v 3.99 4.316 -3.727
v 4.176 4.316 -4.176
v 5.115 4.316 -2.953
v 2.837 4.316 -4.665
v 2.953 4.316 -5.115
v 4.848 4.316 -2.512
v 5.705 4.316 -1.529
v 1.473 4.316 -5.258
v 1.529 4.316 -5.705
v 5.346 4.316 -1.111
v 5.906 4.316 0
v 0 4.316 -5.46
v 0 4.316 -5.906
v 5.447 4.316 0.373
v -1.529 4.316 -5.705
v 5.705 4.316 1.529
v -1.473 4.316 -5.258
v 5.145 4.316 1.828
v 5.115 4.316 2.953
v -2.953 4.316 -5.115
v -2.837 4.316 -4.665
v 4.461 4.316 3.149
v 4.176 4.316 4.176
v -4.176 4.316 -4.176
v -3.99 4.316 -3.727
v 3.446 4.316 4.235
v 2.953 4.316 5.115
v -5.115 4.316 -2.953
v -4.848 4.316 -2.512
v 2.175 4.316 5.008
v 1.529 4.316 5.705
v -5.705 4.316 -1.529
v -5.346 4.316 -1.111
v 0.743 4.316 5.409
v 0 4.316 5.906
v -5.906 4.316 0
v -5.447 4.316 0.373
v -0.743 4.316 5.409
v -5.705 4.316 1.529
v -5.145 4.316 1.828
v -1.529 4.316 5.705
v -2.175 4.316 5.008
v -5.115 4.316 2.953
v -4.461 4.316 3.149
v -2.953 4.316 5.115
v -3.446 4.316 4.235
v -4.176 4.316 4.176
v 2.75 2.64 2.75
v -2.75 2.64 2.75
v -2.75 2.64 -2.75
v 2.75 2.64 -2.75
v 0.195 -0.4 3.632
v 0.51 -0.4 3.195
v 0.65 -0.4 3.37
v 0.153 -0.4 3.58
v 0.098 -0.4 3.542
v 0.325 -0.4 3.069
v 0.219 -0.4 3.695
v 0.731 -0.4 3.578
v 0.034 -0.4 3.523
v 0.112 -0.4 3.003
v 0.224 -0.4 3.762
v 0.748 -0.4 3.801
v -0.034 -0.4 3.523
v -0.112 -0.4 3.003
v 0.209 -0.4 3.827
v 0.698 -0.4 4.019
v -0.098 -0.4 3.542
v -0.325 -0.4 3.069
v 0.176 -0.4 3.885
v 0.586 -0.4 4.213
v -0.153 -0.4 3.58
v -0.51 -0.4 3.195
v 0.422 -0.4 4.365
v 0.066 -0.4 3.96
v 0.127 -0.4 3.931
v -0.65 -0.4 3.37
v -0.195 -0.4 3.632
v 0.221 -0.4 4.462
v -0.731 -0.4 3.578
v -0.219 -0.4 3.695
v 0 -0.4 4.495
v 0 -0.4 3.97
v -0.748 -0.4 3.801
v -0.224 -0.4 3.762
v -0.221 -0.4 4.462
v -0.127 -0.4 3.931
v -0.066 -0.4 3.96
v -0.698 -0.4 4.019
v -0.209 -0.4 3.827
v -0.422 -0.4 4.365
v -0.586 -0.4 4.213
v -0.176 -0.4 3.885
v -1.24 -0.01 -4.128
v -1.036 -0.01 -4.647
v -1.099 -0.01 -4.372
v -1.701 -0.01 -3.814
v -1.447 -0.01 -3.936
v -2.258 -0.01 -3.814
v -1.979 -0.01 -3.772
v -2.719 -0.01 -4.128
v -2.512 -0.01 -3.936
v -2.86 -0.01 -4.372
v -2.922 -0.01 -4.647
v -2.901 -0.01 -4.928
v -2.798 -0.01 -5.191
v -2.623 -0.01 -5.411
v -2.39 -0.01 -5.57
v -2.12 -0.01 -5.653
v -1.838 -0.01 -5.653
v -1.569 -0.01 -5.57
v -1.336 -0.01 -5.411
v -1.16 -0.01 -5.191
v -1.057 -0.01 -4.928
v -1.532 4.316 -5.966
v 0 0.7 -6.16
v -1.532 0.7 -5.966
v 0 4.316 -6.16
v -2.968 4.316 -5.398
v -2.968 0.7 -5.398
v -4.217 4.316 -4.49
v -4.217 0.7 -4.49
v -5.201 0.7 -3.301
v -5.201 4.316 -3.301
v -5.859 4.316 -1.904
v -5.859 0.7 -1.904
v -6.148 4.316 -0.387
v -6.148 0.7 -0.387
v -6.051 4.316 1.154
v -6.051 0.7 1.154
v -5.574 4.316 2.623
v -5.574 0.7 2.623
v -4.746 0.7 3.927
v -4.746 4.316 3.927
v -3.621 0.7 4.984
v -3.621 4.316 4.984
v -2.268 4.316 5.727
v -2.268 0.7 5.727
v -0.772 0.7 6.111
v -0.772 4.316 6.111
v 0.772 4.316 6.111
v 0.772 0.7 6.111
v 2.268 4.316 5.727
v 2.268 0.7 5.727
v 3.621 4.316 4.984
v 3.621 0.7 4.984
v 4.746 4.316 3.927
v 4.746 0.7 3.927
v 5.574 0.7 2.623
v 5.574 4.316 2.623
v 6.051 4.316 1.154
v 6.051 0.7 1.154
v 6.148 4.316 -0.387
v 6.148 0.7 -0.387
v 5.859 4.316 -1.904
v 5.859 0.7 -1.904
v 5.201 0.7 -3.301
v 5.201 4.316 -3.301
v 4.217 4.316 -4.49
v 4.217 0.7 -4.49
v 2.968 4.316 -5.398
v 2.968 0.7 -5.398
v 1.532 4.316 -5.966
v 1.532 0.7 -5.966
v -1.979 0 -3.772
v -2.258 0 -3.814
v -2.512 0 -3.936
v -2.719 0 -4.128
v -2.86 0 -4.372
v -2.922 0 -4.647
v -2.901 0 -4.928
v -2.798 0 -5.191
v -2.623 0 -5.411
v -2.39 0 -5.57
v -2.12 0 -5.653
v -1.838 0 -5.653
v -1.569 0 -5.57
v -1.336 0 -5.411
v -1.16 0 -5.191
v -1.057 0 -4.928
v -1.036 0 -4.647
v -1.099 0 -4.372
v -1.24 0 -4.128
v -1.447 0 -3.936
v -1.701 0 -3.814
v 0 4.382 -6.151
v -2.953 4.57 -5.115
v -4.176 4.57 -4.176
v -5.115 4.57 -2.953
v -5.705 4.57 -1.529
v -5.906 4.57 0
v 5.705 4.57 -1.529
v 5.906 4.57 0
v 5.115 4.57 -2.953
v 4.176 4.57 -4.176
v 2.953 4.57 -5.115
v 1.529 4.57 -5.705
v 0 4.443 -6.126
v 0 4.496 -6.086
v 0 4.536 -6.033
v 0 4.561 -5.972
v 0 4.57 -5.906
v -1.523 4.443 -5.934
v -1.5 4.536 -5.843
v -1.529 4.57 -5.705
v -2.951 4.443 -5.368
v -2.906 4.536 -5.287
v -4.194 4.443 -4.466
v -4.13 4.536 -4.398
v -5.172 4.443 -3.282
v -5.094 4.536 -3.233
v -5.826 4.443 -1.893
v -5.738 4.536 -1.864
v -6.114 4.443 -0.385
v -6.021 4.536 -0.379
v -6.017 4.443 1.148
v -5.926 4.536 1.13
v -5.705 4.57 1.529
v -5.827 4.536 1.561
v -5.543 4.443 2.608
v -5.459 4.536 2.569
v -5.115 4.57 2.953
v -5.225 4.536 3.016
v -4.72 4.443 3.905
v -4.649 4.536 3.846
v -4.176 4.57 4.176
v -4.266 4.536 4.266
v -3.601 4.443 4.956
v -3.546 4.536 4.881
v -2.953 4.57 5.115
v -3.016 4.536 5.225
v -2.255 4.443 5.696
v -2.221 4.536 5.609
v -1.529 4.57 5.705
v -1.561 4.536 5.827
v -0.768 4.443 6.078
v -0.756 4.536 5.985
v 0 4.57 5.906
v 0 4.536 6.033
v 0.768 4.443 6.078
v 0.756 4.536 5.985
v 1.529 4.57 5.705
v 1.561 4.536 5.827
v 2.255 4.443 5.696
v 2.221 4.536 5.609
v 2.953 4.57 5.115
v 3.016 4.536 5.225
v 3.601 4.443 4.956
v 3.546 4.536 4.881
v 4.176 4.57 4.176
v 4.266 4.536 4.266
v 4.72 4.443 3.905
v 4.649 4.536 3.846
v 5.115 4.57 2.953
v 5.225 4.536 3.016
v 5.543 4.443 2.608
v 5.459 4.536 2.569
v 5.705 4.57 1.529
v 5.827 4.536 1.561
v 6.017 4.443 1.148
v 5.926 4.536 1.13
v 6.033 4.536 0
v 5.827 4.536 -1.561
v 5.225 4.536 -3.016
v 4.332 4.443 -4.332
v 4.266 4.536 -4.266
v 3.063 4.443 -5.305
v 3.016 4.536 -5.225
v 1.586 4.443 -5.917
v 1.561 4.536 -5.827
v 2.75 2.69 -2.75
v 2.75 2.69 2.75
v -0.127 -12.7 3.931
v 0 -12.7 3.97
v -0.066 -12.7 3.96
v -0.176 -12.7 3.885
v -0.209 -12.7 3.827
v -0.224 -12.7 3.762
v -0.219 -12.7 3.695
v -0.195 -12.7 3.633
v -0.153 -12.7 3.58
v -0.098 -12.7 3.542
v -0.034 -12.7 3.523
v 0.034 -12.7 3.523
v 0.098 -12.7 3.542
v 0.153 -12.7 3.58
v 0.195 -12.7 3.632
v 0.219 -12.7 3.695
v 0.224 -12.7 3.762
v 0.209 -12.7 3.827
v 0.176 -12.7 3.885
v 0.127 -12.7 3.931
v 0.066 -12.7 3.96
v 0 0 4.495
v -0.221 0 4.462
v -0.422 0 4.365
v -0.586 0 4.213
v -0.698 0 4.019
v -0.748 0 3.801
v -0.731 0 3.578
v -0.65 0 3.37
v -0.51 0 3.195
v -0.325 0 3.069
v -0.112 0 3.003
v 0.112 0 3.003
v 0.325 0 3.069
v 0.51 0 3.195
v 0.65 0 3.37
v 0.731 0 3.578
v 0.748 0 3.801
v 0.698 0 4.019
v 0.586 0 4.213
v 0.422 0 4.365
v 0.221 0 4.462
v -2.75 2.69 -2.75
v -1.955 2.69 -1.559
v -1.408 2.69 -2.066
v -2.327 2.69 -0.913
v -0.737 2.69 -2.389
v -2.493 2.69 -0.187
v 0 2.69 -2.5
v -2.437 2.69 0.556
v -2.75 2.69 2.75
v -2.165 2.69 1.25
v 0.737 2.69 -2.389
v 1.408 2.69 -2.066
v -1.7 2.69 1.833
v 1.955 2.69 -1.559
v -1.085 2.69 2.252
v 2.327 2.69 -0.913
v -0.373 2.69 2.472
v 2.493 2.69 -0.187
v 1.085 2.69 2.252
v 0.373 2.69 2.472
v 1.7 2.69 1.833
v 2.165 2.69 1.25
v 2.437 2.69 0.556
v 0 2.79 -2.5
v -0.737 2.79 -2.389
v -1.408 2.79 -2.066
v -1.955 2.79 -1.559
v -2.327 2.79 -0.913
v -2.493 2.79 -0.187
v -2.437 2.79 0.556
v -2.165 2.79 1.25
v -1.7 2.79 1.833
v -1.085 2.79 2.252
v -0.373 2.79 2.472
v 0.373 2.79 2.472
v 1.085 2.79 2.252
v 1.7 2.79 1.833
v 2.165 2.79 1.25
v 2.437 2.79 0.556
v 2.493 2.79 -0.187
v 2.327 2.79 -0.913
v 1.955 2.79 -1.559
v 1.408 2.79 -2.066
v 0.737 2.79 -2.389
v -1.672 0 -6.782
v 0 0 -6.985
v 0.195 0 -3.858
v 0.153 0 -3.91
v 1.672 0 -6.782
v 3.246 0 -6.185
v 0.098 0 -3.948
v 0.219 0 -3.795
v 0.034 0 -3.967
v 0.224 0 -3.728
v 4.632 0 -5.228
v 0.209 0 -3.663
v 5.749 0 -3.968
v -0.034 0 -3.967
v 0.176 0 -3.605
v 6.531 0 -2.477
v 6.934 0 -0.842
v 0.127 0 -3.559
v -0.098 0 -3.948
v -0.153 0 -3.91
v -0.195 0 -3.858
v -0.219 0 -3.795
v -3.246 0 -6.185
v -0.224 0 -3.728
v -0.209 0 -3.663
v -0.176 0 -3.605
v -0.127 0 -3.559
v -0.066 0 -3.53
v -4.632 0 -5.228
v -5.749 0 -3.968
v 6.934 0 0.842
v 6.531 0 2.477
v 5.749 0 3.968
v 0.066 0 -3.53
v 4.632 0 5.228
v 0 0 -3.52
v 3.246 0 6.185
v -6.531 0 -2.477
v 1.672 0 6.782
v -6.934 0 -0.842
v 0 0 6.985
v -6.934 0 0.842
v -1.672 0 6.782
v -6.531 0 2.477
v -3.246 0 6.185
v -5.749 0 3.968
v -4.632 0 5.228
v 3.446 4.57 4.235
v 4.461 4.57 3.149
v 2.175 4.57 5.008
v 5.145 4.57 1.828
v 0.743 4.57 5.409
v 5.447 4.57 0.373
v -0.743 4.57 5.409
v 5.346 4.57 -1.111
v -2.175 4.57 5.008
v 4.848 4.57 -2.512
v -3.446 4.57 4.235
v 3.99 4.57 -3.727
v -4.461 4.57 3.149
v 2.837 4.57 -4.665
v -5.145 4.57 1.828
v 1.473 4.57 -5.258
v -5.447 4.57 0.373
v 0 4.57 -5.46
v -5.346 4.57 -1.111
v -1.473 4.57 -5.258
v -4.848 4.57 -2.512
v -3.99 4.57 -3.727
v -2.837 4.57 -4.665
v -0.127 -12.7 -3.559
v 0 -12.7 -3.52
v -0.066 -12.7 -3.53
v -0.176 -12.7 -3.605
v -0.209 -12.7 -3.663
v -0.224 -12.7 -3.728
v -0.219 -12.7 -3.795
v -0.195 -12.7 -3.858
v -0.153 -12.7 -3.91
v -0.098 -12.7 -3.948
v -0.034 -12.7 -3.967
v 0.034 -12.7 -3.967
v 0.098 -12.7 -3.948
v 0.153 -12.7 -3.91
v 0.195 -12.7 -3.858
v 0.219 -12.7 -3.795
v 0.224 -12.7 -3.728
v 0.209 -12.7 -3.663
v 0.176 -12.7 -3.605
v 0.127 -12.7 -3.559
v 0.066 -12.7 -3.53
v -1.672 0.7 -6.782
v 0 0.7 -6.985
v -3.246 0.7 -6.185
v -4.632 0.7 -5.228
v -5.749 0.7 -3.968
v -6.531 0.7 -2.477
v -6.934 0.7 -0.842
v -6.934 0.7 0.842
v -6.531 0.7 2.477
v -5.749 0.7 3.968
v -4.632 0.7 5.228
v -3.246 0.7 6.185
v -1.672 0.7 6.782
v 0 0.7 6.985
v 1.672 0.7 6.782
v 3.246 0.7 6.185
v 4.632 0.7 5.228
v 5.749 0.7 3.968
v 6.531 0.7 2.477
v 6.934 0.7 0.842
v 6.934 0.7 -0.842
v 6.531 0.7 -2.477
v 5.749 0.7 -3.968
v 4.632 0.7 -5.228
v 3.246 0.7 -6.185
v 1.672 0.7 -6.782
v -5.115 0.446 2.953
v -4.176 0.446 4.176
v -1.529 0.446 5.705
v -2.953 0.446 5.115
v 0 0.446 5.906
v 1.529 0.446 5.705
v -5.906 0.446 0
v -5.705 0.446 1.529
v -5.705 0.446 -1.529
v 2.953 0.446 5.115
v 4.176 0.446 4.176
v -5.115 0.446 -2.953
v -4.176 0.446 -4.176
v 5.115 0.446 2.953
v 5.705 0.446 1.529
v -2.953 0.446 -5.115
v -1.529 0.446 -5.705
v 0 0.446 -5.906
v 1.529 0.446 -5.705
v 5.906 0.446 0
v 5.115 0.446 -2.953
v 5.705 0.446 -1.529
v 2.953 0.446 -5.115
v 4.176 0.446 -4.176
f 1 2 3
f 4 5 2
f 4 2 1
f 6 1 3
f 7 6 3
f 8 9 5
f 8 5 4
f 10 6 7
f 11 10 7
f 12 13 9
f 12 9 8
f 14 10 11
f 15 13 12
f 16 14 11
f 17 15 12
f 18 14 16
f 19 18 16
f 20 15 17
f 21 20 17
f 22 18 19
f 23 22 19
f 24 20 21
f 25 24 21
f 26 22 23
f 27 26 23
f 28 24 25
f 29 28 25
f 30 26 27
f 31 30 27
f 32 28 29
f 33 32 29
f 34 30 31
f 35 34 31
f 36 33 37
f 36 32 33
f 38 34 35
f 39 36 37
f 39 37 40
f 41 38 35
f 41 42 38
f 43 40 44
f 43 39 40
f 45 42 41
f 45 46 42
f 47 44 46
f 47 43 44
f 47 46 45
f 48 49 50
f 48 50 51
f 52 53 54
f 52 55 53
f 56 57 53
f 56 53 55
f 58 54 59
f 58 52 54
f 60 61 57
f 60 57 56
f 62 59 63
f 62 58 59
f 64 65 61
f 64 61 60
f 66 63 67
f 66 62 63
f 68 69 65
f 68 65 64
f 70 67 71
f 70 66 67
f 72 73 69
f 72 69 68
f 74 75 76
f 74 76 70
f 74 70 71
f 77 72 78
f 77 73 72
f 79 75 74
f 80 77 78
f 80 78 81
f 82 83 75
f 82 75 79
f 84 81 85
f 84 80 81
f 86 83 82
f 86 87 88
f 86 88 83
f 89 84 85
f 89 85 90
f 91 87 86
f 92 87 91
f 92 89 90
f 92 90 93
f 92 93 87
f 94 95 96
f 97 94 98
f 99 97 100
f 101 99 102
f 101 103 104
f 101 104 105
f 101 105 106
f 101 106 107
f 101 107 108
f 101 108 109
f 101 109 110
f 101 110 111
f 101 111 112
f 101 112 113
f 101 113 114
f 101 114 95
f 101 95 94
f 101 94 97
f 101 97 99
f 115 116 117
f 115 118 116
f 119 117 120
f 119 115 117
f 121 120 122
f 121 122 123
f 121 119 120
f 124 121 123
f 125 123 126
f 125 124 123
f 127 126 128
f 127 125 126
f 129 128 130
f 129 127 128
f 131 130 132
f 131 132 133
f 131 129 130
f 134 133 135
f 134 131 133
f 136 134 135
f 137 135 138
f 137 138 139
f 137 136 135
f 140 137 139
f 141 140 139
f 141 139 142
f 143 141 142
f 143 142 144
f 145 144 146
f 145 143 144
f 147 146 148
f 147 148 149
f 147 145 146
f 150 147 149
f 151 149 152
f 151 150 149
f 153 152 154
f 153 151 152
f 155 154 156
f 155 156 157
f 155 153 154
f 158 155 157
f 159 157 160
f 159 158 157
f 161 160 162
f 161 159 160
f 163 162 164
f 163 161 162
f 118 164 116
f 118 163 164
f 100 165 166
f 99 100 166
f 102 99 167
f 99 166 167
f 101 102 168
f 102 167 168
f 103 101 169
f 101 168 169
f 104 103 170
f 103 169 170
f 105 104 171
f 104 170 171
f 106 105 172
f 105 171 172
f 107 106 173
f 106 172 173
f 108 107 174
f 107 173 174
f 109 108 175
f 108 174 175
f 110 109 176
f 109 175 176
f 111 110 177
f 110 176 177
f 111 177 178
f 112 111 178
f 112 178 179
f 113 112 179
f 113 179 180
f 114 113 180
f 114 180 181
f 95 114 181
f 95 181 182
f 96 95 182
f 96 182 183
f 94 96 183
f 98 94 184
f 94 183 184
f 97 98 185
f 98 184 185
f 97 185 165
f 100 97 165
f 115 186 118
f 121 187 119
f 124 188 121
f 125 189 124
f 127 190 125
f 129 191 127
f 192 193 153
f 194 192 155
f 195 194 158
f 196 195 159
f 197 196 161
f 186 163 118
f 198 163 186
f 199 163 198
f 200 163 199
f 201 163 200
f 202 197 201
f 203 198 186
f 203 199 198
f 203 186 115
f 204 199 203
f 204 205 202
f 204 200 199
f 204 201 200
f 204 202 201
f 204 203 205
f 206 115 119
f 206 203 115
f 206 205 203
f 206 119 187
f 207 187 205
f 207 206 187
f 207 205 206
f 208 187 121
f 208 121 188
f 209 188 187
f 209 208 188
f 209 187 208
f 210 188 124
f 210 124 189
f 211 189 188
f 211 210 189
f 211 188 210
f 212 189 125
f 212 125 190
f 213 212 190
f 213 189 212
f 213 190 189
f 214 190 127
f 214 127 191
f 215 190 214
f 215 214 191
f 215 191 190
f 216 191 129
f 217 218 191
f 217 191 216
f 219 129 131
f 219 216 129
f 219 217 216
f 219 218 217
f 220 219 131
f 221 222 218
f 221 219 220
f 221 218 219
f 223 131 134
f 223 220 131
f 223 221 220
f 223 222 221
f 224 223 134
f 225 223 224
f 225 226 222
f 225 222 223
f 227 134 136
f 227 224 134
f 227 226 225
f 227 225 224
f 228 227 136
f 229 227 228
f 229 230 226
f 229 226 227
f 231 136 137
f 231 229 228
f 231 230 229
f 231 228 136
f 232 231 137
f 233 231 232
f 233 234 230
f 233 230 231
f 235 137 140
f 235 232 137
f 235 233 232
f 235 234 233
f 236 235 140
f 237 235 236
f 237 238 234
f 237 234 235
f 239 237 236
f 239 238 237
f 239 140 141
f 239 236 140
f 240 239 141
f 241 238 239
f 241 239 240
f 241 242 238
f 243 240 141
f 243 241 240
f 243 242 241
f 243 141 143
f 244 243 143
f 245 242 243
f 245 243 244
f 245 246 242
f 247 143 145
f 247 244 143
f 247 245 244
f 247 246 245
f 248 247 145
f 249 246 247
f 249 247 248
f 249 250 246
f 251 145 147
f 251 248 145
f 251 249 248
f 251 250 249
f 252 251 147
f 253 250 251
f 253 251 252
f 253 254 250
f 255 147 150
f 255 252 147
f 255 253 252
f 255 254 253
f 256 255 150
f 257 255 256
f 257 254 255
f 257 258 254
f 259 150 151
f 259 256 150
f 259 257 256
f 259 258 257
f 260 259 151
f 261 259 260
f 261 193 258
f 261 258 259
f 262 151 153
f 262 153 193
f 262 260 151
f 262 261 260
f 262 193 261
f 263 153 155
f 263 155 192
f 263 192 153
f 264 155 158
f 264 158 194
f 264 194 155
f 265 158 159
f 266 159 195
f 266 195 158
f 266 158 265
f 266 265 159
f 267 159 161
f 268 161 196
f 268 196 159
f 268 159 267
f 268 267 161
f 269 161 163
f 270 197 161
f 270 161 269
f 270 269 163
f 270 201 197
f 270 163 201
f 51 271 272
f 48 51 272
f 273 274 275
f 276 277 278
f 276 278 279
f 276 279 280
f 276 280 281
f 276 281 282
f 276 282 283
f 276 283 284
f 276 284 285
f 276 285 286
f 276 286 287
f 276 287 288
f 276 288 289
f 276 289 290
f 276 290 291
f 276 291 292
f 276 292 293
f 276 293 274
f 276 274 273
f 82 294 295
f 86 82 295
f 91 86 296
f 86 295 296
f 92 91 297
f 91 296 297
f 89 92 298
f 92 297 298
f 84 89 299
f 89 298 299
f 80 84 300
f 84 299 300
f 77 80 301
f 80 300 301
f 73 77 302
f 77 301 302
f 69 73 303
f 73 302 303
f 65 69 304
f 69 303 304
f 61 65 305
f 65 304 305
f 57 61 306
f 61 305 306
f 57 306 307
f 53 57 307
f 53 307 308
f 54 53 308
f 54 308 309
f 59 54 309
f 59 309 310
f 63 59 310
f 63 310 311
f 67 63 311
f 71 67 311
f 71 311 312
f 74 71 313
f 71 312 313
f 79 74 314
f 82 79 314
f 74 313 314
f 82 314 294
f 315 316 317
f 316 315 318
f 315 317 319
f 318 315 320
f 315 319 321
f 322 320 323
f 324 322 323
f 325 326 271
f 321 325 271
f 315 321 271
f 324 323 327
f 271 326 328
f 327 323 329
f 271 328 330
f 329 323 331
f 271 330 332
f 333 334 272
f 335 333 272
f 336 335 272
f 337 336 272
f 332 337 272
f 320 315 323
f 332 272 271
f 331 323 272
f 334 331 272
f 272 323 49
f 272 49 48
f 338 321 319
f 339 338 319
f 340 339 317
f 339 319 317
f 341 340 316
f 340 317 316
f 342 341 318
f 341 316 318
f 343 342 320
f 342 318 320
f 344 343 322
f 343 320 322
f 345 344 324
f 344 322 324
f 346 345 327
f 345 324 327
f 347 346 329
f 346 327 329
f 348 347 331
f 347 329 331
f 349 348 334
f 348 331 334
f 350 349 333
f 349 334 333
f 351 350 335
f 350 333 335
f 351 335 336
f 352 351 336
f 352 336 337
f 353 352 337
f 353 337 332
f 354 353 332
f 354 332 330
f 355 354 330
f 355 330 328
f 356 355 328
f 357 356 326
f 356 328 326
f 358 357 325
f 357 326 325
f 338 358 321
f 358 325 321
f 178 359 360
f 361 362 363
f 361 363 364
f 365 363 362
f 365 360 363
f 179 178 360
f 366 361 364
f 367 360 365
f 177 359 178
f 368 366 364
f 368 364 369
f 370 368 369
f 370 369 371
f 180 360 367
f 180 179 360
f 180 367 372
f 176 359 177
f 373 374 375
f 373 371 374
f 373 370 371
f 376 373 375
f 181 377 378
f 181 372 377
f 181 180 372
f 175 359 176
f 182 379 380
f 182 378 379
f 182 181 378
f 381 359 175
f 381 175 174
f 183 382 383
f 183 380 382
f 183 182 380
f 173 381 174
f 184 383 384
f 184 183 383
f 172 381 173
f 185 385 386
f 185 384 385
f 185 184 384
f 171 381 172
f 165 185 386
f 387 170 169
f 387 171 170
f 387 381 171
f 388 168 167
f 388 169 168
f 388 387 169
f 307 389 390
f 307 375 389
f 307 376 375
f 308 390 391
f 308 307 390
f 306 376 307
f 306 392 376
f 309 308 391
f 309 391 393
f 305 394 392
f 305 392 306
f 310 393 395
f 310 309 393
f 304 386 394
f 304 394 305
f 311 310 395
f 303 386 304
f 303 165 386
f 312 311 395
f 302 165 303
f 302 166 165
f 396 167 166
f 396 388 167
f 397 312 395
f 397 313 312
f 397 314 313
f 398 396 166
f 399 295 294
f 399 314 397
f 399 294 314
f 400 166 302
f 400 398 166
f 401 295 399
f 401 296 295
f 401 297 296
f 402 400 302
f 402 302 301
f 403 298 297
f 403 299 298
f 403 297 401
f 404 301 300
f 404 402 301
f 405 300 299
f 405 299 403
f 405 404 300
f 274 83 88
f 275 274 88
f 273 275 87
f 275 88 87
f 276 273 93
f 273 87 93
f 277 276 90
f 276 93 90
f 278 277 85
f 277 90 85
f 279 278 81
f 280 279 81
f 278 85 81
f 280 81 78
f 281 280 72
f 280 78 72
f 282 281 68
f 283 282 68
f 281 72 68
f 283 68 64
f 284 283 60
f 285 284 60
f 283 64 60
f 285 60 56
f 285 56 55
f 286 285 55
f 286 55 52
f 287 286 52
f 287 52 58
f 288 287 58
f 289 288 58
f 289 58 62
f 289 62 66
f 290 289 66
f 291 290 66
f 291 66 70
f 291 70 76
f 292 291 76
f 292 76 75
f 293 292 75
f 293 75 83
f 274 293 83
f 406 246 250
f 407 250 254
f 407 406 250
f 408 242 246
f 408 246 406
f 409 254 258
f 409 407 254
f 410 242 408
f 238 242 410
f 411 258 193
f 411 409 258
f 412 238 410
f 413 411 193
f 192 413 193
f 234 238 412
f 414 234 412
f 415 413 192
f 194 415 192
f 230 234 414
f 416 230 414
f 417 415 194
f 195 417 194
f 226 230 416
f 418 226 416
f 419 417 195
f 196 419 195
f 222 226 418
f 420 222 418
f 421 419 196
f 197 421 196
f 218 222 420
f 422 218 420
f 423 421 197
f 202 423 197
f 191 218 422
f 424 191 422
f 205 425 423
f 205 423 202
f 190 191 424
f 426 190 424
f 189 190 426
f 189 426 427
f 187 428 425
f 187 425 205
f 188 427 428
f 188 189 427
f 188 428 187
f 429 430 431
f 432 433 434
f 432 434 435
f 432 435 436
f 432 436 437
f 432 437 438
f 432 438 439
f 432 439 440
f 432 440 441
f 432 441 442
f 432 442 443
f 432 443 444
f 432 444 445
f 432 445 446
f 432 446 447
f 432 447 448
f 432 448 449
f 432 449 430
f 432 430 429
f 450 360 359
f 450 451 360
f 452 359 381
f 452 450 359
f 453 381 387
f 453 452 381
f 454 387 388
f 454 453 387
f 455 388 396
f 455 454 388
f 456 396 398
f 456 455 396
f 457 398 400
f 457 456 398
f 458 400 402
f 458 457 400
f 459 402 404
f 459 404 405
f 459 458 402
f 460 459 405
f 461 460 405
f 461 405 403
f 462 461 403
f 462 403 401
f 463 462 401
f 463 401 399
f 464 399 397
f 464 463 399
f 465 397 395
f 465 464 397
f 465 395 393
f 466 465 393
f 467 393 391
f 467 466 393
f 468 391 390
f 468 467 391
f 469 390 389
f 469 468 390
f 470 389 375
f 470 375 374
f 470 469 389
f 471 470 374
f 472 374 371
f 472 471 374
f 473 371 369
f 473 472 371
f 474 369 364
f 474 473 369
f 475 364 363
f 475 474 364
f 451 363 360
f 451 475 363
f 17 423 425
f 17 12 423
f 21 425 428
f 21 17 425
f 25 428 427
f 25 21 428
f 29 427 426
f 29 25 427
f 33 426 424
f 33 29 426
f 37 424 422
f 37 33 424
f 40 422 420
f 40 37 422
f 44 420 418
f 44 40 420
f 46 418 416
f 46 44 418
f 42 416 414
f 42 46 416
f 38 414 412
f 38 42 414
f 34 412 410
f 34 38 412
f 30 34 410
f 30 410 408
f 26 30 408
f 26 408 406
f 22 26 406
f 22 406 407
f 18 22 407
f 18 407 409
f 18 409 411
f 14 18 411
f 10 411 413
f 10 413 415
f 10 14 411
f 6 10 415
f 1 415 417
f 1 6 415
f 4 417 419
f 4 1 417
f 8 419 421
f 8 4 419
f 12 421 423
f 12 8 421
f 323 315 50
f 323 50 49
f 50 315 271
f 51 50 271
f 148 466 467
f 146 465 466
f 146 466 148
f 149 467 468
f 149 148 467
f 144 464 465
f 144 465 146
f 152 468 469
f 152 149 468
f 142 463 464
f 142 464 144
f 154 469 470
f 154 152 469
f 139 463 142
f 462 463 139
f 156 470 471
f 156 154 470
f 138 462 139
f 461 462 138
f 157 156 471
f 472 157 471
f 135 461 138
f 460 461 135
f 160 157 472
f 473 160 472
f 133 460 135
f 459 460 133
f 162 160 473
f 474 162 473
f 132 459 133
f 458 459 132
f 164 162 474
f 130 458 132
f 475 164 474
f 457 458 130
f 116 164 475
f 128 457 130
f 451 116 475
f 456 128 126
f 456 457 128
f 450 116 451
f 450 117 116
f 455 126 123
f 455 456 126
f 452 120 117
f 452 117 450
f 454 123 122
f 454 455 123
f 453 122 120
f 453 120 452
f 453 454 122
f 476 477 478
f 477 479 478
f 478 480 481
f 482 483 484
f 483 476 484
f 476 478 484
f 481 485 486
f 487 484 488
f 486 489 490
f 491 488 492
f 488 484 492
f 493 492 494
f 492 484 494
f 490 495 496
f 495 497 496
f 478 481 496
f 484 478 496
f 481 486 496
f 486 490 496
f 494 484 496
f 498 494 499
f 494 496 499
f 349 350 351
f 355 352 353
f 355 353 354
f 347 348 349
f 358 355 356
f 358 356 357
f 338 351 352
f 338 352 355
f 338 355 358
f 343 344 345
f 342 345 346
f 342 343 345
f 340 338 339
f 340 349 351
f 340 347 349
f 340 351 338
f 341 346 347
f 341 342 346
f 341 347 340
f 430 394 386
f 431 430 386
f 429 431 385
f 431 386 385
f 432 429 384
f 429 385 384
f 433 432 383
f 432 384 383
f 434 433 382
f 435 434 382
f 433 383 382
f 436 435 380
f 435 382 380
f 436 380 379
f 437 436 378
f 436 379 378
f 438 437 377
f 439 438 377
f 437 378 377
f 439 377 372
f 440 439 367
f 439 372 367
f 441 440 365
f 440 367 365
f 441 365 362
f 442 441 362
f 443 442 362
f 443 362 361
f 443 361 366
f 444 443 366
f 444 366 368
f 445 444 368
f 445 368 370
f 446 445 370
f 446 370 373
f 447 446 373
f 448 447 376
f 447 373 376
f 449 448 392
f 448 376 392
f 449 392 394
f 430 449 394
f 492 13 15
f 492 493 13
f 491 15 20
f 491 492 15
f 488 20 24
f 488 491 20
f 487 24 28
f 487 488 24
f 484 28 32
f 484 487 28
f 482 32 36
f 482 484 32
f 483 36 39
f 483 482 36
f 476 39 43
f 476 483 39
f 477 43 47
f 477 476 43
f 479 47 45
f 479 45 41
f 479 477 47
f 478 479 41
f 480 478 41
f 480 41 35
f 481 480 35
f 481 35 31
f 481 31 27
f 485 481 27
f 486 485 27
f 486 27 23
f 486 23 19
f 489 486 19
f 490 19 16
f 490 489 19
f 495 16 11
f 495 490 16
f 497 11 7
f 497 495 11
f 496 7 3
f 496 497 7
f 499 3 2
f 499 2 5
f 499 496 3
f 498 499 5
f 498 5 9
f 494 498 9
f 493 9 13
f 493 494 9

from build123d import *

# Parameters (mm, degrees)
SKETCH2_R           = 6.985
BOSS_EXTRUDE1_DEPTH = 0.446
BOSS_EXTRUDE2_START = -2.69
SKETCH3_W           = 5.5
SKETCH3_H           = 5.5
BOSS_EXTRUDE2_DEPTH = 0.05
SKETCH8_R           = 2.5
BOSS_EXTRUDE6_DEPTH = 0.1
SKETCH5_R           = 0.225
BOSS_EXTRUDE4_DEPTH = 12.7
SKETCH7_R           = 0.75
BOSS_EXTRUDE5_DEPTH = 0.4
SKETCH9_R           = 0.945778117
BOSS_EXTRUDE7_DEPTH = 0.01


with BuildPart() as part:
    # Sketch1 → Revolve-Thin2 (revolve)
    with BuildSketch(Plane.XY, mode=Mode.PRIVATE) as revolve_thin2_sk:
        with BuildLine():
            Line((6.985, 0), (6.985, 0.7))
            Line((6.985, 0.7), (6.16, 0.7))
            Line((6.16, 0.7), (6.16, 4.316))
            ThreePointArc((6.16, 4.316), (6.085605122, 4.495605122), (5.906, 4.57))
            Line((5.906, 4.57), (5.46, 4.57))
            Line((5.46, 4.57), (5.46, 4.316))
            Line((5.46, 4.316), (5.906, 4.316))
            Line((5.906, 4.316), (5.906, 0.446))
            Line((5.906, 0.446), (6.731, 0.446))
            Line((6.731, 0.446), (6.731, 0))
            Line((6.731, 0), (6.985, 0))
        make_face()
    revolve(revolve_thin2_sk.sketch.rotate(Axis((0, 0, 0), (0, 1, 0)), 90), axis=Axis((0, 0, 0), (0, 1, 0)))  # turned: the seam where the file's is

    # Sketch2 → Boss-Extrude1 (add)
    with BuildSketch(Plane.XZ):
        with Locations(Location((0, 0, 0), (0, 0, 270))):  # turned: the seam where the file's is
            Circle(SKETCH2_R)
    extrude(amount=-BOSS_EXTRUDE1_DEPTH)

    # Sketch5 → Boss-Extrude4 (add)
    with BuildSketch(Plane.XZ):
        with Locations(Location((0, -3.745, 0), (0, 0, 90))):  # turned: the seam where the file's is
            Circle(SKETCH5_R)
        with Locations(Location((0, 3.745, 0), (0, 0, 90))):  # turned: the seam where the file's is
            Circle(SKETCH5_R)
    extrude(amount=BOSS_EXTRUDE4_DEPTH)

    # Sketch7 → Boss-Extrude5 (add)
    with BuildSketch(Plane.XZ):
        with Locations(Location((0, 3.745, 0), (0, 0, 90))):  # turned: the seam where the file's is
            Circle(SKETCH7_R)
    extrude(amount=BOSS_EXTRUDE5_DEPTH)

    # Sketch9 → Boss-Extrude7 (add)
    with BuildSketch(Plane.XZ):
        with Locations(Location((-1.979317746, -4.717617413, 0), (0, 0, 90))):  # turned: the seam where the file's is
            Circle(SKETCH9_R)
    extrude(amount=BOSS_EXTRUDE7_DEPTH)


with BuildPart() as body_2:
    # Sketch3 → Boss-Extrude2 (new body)
    with BuildSketch(Plane.XZ.offset(BOSS_EXTRUDE2_START)):
        Rectangle(SKETCH3_W, SKETCH3_H)
    extrude(amount=BOSS_EXTRUDE2_DEPTH)

    # Sketch8 → Boss-Extrude6 (add)
    with BuildSketch(Plane(origin=(0, 2.69, 0), x_dir=(-1, 0, 0), z_dir=(0, 1, 0))):
        with Locations(Location((0, 0, 0), (0, 0, 270))):  # turned: the seam where the file's is
            Circle(SKETCH8_R)
    extrude(amount=BOSS_EXTRUDE6_DEPTH)


solid = Compound([part.part, body_2.part])
